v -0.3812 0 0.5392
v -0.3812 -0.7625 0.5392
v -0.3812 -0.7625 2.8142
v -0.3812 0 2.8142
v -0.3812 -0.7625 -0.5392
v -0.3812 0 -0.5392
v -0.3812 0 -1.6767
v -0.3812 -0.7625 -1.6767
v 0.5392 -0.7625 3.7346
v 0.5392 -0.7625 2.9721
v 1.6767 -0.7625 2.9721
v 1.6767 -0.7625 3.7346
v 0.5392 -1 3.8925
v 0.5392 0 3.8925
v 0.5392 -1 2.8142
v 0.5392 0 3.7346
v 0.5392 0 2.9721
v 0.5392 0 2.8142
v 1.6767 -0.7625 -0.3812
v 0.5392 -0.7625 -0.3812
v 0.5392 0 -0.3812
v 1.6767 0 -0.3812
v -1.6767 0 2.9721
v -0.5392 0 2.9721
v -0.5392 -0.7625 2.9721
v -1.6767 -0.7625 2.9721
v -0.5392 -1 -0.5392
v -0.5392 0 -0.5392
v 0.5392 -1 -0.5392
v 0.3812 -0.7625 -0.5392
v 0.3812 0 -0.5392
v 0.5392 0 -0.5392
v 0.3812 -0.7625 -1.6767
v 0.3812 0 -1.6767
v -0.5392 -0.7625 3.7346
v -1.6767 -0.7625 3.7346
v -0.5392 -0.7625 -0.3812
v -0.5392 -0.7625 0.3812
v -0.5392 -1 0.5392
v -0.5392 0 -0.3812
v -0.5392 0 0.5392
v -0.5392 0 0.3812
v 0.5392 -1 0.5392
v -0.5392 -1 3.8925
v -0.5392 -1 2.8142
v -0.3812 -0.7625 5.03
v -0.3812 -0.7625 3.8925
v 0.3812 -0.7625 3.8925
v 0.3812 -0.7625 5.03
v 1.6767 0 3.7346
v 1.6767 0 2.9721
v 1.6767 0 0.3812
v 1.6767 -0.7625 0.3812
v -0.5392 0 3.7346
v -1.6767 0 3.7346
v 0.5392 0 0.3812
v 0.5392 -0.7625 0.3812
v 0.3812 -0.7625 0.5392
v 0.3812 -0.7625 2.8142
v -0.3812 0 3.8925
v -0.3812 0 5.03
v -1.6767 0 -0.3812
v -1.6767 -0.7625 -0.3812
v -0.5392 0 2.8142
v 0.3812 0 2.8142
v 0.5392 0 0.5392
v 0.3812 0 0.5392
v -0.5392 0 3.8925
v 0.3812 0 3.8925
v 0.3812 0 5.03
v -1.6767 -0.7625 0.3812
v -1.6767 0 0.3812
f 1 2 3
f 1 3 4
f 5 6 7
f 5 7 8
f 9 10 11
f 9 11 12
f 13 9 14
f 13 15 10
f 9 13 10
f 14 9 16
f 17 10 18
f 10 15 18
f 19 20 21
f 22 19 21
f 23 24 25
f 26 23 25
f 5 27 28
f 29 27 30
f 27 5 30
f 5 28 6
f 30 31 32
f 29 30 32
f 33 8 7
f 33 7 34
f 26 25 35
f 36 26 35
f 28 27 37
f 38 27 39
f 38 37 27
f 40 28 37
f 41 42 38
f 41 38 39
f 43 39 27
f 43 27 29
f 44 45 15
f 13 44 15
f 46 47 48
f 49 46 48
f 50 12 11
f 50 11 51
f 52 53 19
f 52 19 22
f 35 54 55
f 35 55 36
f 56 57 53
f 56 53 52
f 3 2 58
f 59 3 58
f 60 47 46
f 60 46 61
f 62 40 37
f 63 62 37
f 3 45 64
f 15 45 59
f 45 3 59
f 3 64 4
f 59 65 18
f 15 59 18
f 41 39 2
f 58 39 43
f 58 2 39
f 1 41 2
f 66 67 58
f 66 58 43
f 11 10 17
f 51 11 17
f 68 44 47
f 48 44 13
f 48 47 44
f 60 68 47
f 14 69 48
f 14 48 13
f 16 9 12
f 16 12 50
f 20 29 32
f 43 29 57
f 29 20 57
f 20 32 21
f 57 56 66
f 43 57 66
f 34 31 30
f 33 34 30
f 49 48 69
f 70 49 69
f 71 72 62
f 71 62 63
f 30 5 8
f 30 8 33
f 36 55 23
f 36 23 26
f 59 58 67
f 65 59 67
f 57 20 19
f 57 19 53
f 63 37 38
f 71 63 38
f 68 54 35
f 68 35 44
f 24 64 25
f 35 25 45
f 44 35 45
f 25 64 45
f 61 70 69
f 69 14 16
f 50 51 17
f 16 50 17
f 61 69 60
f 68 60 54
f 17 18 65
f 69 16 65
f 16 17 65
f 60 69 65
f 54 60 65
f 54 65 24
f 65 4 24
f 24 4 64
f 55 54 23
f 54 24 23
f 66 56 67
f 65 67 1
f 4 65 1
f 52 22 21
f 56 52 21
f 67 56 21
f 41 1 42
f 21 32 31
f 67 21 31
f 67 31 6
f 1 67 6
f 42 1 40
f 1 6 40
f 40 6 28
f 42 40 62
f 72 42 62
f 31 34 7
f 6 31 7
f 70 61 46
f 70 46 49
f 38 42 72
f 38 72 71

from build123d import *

# Parameters (mm, degrees)
F0_W      = 1.07834
F0_H      = 1.07834
F1_DEPTH  = 1
F2_W      = 0.7625
F2_H      = 0.7625
F3_DEPTH  = 1.1375
F4_W      = 0.7625
F4_H      = 0.7625
F5_DEPTH  = 1.1375
F6_W      = 0.7625
F6_H      = 0.7625
F7_DEPTH  = 1.1375
F8_W      = 0.7625
F8_H      = 0.7625
F9_DEPTH  = 2.275
F11_DEPTH = 1.07834
F12_W     = 0.7625
F12_H     = 0.7625
F13_DEPTH = 1.1375
F14_W     = 0.7625
F14_H     = 0.7625
F15_DEPTH = 1.1375
F16_W     = 0.7625
F16_H     = 0.7625
F17_DEPTH = 1.1375


with BuildPart() as f1:
    # F0 (on Front) → F1 (new body)
    with BuildSketch(Plane.XZ):
        Rectangle(F0_W, F0_H)
    extrude(amount=F1_DEPTH)

    # F2 (on face) → F3 (join)
    with BuildSketch(Plane(origin=(0, 0, -0.53917), x_dir=(1, 0, 0), z_dir=(0, 0, -1))):
        with Locations((0, 0.38125)):
            Rectangle(F2_W, F2_H)
    extrude(amount=F3_DEPTH)

    # F4 (on face) → F5 (join)
    with BuildSketch(Plane(origin=(-0.53917, 0, 0), x_dir=(0, -1, 0), z_dir=(-1, 0, 0))):
        with Locations((0.38125, 0)):
            Rectangle(F4_W, F4_H)
    extrude(amount=F5_DEPTH)

    # F6 (on face) → F7 (join)
    with BuildSketch(Plane.YZ.offset(0.53917)):
        with Locations((-0.38125, 0)):
            Rectangle(F6_W, F6_H)
    extrude(amount=F7_DEPTH)

    # F8 (on face) → F9 (join)
    with BuildSketch(Plane.XY.offset(0.53917)):
        with Locations((0, -0.38125)):
            Rectangle(F8_W, F8_H)
    extrude(amount=F9_DEPTH)

    # F10 (on face) → F11 (join)
    with BuildSketch(Plane.XY.offset(2.81417)):
        Polygon((0.53917, 0), (0.38125, 0), (-0.53917, 0), (-0.53917, -1), (0.53917, -1), align=None)
    extrude(amount=F11_DEPTH)

    # F12 (on face) → F13 (join)
    with BuildSketch(Plane.YZ.offset(0.53917)):
        with Locations((-0.38125, 3.35334)):
            Rectangle(F12_W, F12_H)
    extrude(amount=F13_DEPTH)

    # F14 (on face) → F15 (join)
    with BuildSketch(Plane.XY.offset(3.89251)):
        with Locations((0, -0.38125)):
            Rectangle(F14_W, F14_H)
    extrude(amount=F15_DEPTH)

    # F16 (on face) → F17 (join)
    with BuildSketch(Plane(origin=(-0.53917, 0, 0), x_dir=(0, -1, 0), z_dir=(-1, 0, 0))):
        with Locations((0.38125, 3.35334)):
            Rectangle(F16_W, F16_H)
    extrude(amount=F17_DEPTH)


solid = f1.part
